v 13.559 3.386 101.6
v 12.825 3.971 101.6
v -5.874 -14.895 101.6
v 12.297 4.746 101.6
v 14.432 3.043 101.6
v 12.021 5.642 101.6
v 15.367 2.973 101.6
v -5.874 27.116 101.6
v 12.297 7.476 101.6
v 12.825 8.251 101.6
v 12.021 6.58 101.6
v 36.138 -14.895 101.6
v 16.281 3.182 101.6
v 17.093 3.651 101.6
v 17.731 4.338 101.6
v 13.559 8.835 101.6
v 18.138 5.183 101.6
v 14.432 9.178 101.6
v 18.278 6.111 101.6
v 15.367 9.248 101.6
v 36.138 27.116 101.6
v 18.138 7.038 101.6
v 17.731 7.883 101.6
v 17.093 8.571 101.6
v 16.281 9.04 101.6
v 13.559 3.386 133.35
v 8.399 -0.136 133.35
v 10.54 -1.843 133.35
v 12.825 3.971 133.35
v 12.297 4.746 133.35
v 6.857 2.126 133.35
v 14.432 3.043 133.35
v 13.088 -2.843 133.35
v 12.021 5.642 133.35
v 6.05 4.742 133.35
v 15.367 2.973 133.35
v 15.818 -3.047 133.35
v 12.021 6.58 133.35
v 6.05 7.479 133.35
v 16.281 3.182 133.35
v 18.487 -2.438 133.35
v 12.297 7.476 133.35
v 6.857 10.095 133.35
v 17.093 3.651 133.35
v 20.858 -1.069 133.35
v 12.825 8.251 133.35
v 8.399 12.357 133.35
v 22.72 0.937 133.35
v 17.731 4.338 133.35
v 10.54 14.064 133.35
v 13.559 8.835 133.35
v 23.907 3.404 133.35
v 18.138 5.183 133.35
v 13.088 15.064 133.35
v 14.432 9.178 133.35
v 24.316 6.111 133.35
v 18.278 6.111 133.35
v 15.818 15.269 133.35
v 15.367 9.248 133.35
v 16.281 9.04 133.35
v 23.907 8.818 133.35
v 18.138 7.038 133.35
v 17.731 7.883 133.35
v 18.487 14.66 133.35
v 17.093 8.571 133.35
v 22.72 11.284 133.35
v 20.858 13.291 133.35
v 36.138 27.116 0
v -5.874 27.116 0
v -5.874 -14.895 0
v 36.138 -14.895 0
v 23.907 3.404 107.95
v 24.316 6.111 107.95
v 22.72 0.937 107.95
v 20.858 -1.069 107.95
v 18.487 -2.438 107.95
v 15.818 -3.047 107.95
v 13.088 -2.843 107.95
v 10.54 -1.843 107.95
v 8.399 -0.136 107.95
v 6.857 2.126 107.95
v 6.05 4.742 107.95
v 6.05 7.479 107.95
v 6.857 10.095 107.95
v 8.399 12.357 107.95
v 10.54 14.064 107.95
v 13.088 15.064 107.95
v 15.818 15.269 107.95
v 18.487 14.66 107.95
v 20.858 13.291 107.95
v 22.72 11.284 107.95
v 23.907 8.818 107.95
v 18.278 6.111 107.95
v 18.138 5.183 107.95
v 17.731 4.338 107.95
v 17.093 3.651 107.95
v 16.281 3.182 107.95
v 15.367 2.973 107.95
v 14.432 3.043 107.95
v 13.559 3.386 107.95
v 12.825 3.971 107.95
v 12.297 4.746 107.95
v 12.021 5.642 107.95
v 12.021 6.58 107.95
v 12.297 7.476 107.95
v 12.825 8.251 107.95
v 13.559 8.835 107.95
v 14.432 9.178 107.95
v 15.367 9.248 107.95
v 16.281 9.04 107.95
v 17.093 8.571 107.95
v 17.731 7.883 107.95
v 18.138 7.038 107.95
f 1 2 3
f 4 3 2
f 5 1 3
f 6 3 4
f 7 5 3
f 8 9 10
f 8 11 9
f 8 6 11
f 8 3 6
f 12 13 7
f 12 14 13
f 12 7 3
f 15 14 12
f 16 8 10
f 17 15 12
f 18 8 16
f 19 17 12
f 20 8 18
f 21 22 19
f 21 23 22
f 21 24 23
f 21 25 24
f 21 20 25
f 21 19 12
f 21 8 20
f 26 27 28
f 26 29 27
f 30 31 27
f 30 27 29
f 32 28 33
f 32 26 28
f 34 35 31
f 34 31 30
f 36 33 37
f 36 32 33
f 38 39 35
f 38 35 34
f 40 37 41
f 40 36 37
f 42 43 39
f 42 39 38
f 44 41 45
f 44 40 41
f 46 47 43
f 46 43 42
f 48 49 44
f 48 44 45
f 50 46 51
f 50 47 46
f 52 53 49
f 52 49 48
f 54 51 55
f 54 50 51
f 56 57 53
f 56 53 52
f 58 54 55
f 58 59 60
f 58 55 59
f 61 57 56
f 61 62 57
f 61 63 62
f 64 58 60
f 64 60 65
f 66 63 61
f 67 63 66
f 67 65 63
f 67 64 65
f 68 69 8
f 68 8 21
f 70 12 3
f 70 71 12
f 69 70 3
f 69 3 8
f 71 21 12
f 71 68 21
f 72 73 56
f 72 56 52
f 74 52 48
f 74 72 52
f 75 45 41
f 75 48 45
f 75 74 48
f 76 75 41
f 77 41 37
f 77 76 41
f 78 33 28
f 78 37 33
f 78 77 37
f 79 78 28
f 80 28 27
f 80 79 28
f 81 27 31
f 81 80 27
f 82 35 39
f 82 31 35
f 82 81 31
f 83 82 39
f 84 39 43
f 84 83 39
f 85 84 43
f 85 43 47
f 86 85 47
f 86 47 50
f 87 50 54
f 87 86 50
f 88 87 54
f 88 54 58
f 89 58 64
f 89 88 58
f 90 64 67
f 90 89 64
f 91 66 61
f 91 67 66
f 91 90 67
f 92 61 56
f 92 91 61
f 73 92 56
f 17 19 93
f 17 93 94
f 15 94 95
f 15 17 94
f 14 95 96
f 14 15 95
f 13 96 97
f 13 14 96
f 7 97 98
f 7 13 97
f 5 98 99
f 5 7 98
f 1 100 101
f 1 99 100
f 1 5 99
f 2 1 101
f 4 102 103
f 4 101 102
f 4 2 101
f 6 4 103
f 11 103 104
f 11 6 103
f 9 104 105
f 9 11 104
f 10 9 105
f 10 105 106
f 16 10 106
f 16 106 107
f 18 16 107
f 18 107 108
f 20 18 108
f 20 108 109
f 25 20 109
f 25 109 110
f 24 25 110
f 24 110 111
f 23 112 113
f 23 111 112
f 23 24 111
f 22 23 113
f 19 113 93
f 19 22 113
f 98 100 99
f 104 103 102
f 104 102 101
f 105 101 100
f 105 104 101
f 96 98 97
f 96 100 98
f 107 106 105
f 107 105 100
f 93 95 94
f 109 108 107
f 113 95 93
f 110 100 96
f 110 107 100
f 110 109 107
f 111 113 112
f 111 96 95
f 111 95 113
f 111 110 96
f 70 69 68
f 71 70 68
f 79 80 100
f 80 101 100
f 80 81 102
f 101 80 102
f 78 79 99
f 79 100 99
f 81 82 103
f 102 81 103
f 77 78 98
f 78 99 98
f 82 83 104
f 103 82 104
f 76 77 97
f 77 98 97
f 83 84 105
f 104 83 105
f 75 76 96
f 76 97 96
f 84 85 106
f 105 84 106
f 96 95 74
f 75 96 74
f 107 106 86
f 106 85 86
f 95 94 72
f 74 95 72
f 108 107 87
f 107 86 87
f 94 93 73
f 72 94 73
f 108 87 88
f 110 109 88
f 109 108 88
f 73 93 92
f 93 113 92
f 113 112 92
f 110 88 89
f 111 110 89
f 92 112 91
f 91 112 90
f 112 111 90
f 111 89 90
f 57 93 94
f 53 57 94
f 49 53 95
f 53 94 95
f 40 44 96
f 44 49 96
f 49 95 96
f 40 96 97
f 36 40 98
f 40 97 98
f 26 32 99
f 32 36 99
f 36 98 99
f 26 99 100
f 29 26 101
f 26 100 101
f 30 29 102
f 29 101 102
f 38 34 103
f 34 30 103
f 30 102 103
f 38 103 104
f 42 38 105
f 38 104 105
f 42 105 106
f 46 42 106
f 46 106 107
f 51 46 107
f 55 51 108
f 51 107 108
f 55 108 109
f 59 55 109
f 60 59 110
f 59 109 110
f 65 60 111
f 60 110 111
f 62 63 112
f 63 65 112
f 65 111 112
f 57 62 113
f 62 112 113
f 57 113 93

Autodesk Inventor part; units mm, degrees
ref_plane "YZ Plane" through (0, 0, 0) normal (1, 0, 0) x (0, 1, 0)
ref_plane "XZ Plane" through (0, 0, 0) normal (0, 1, 0) x (-1, 0, 0)
ref_plane "XY Plane" through (0, 0, 0) normal (0, 0, 1) x (1, 0, 0)
sketch "Sketch1" plane through (0, 0, 0) normal (0, 0, 1) x (1, 0, 0)
  line L0 (-5.8741, 27.1165) -> (36.1375, 27.1165)
  line L1 (36.1375, 27.1165) -> (36.1375, -14.8951)
  line L2 (36.1375, -14.8951) -> (-5.8741, -14.8951)
  line L3 (-5.8741, -14.8951) -> (-5.8741, 27.1165)
  point P0 (0, 0)
  dimension "d0" = 42.0116
  dimension "d1" = 42.0116
extrude "Extrusion1" add sketch "Sketch1" along normal blind 101.6
sketch "Sketch2" plane through (0, 0, 101.6) normal (0, 0, 1) x (1, 0, 0)
  circle A0 centre (15.1317, 6.1107) radius 3.1463
  point P0 (0, 0)
extrude "Extrusion2" add sketch "Sketch2" along normal blind 6.35
sketch "Sketch3" plane through (15.1317, 6.1107, 107.95) normal (0, 0, 1) x (1, 0, 0)
  circle A0 centre (0, 0) radius 3.1463 projected
  circle A1 centre (0, 0) radius 9.1838
  point P0 (-15.1317, -6.1107)
extrude "Extrusion3" add sketch "Sketch3" along normal blind 25.4
equation "\"d1\" = d0"
properties part number "Big stepper"
